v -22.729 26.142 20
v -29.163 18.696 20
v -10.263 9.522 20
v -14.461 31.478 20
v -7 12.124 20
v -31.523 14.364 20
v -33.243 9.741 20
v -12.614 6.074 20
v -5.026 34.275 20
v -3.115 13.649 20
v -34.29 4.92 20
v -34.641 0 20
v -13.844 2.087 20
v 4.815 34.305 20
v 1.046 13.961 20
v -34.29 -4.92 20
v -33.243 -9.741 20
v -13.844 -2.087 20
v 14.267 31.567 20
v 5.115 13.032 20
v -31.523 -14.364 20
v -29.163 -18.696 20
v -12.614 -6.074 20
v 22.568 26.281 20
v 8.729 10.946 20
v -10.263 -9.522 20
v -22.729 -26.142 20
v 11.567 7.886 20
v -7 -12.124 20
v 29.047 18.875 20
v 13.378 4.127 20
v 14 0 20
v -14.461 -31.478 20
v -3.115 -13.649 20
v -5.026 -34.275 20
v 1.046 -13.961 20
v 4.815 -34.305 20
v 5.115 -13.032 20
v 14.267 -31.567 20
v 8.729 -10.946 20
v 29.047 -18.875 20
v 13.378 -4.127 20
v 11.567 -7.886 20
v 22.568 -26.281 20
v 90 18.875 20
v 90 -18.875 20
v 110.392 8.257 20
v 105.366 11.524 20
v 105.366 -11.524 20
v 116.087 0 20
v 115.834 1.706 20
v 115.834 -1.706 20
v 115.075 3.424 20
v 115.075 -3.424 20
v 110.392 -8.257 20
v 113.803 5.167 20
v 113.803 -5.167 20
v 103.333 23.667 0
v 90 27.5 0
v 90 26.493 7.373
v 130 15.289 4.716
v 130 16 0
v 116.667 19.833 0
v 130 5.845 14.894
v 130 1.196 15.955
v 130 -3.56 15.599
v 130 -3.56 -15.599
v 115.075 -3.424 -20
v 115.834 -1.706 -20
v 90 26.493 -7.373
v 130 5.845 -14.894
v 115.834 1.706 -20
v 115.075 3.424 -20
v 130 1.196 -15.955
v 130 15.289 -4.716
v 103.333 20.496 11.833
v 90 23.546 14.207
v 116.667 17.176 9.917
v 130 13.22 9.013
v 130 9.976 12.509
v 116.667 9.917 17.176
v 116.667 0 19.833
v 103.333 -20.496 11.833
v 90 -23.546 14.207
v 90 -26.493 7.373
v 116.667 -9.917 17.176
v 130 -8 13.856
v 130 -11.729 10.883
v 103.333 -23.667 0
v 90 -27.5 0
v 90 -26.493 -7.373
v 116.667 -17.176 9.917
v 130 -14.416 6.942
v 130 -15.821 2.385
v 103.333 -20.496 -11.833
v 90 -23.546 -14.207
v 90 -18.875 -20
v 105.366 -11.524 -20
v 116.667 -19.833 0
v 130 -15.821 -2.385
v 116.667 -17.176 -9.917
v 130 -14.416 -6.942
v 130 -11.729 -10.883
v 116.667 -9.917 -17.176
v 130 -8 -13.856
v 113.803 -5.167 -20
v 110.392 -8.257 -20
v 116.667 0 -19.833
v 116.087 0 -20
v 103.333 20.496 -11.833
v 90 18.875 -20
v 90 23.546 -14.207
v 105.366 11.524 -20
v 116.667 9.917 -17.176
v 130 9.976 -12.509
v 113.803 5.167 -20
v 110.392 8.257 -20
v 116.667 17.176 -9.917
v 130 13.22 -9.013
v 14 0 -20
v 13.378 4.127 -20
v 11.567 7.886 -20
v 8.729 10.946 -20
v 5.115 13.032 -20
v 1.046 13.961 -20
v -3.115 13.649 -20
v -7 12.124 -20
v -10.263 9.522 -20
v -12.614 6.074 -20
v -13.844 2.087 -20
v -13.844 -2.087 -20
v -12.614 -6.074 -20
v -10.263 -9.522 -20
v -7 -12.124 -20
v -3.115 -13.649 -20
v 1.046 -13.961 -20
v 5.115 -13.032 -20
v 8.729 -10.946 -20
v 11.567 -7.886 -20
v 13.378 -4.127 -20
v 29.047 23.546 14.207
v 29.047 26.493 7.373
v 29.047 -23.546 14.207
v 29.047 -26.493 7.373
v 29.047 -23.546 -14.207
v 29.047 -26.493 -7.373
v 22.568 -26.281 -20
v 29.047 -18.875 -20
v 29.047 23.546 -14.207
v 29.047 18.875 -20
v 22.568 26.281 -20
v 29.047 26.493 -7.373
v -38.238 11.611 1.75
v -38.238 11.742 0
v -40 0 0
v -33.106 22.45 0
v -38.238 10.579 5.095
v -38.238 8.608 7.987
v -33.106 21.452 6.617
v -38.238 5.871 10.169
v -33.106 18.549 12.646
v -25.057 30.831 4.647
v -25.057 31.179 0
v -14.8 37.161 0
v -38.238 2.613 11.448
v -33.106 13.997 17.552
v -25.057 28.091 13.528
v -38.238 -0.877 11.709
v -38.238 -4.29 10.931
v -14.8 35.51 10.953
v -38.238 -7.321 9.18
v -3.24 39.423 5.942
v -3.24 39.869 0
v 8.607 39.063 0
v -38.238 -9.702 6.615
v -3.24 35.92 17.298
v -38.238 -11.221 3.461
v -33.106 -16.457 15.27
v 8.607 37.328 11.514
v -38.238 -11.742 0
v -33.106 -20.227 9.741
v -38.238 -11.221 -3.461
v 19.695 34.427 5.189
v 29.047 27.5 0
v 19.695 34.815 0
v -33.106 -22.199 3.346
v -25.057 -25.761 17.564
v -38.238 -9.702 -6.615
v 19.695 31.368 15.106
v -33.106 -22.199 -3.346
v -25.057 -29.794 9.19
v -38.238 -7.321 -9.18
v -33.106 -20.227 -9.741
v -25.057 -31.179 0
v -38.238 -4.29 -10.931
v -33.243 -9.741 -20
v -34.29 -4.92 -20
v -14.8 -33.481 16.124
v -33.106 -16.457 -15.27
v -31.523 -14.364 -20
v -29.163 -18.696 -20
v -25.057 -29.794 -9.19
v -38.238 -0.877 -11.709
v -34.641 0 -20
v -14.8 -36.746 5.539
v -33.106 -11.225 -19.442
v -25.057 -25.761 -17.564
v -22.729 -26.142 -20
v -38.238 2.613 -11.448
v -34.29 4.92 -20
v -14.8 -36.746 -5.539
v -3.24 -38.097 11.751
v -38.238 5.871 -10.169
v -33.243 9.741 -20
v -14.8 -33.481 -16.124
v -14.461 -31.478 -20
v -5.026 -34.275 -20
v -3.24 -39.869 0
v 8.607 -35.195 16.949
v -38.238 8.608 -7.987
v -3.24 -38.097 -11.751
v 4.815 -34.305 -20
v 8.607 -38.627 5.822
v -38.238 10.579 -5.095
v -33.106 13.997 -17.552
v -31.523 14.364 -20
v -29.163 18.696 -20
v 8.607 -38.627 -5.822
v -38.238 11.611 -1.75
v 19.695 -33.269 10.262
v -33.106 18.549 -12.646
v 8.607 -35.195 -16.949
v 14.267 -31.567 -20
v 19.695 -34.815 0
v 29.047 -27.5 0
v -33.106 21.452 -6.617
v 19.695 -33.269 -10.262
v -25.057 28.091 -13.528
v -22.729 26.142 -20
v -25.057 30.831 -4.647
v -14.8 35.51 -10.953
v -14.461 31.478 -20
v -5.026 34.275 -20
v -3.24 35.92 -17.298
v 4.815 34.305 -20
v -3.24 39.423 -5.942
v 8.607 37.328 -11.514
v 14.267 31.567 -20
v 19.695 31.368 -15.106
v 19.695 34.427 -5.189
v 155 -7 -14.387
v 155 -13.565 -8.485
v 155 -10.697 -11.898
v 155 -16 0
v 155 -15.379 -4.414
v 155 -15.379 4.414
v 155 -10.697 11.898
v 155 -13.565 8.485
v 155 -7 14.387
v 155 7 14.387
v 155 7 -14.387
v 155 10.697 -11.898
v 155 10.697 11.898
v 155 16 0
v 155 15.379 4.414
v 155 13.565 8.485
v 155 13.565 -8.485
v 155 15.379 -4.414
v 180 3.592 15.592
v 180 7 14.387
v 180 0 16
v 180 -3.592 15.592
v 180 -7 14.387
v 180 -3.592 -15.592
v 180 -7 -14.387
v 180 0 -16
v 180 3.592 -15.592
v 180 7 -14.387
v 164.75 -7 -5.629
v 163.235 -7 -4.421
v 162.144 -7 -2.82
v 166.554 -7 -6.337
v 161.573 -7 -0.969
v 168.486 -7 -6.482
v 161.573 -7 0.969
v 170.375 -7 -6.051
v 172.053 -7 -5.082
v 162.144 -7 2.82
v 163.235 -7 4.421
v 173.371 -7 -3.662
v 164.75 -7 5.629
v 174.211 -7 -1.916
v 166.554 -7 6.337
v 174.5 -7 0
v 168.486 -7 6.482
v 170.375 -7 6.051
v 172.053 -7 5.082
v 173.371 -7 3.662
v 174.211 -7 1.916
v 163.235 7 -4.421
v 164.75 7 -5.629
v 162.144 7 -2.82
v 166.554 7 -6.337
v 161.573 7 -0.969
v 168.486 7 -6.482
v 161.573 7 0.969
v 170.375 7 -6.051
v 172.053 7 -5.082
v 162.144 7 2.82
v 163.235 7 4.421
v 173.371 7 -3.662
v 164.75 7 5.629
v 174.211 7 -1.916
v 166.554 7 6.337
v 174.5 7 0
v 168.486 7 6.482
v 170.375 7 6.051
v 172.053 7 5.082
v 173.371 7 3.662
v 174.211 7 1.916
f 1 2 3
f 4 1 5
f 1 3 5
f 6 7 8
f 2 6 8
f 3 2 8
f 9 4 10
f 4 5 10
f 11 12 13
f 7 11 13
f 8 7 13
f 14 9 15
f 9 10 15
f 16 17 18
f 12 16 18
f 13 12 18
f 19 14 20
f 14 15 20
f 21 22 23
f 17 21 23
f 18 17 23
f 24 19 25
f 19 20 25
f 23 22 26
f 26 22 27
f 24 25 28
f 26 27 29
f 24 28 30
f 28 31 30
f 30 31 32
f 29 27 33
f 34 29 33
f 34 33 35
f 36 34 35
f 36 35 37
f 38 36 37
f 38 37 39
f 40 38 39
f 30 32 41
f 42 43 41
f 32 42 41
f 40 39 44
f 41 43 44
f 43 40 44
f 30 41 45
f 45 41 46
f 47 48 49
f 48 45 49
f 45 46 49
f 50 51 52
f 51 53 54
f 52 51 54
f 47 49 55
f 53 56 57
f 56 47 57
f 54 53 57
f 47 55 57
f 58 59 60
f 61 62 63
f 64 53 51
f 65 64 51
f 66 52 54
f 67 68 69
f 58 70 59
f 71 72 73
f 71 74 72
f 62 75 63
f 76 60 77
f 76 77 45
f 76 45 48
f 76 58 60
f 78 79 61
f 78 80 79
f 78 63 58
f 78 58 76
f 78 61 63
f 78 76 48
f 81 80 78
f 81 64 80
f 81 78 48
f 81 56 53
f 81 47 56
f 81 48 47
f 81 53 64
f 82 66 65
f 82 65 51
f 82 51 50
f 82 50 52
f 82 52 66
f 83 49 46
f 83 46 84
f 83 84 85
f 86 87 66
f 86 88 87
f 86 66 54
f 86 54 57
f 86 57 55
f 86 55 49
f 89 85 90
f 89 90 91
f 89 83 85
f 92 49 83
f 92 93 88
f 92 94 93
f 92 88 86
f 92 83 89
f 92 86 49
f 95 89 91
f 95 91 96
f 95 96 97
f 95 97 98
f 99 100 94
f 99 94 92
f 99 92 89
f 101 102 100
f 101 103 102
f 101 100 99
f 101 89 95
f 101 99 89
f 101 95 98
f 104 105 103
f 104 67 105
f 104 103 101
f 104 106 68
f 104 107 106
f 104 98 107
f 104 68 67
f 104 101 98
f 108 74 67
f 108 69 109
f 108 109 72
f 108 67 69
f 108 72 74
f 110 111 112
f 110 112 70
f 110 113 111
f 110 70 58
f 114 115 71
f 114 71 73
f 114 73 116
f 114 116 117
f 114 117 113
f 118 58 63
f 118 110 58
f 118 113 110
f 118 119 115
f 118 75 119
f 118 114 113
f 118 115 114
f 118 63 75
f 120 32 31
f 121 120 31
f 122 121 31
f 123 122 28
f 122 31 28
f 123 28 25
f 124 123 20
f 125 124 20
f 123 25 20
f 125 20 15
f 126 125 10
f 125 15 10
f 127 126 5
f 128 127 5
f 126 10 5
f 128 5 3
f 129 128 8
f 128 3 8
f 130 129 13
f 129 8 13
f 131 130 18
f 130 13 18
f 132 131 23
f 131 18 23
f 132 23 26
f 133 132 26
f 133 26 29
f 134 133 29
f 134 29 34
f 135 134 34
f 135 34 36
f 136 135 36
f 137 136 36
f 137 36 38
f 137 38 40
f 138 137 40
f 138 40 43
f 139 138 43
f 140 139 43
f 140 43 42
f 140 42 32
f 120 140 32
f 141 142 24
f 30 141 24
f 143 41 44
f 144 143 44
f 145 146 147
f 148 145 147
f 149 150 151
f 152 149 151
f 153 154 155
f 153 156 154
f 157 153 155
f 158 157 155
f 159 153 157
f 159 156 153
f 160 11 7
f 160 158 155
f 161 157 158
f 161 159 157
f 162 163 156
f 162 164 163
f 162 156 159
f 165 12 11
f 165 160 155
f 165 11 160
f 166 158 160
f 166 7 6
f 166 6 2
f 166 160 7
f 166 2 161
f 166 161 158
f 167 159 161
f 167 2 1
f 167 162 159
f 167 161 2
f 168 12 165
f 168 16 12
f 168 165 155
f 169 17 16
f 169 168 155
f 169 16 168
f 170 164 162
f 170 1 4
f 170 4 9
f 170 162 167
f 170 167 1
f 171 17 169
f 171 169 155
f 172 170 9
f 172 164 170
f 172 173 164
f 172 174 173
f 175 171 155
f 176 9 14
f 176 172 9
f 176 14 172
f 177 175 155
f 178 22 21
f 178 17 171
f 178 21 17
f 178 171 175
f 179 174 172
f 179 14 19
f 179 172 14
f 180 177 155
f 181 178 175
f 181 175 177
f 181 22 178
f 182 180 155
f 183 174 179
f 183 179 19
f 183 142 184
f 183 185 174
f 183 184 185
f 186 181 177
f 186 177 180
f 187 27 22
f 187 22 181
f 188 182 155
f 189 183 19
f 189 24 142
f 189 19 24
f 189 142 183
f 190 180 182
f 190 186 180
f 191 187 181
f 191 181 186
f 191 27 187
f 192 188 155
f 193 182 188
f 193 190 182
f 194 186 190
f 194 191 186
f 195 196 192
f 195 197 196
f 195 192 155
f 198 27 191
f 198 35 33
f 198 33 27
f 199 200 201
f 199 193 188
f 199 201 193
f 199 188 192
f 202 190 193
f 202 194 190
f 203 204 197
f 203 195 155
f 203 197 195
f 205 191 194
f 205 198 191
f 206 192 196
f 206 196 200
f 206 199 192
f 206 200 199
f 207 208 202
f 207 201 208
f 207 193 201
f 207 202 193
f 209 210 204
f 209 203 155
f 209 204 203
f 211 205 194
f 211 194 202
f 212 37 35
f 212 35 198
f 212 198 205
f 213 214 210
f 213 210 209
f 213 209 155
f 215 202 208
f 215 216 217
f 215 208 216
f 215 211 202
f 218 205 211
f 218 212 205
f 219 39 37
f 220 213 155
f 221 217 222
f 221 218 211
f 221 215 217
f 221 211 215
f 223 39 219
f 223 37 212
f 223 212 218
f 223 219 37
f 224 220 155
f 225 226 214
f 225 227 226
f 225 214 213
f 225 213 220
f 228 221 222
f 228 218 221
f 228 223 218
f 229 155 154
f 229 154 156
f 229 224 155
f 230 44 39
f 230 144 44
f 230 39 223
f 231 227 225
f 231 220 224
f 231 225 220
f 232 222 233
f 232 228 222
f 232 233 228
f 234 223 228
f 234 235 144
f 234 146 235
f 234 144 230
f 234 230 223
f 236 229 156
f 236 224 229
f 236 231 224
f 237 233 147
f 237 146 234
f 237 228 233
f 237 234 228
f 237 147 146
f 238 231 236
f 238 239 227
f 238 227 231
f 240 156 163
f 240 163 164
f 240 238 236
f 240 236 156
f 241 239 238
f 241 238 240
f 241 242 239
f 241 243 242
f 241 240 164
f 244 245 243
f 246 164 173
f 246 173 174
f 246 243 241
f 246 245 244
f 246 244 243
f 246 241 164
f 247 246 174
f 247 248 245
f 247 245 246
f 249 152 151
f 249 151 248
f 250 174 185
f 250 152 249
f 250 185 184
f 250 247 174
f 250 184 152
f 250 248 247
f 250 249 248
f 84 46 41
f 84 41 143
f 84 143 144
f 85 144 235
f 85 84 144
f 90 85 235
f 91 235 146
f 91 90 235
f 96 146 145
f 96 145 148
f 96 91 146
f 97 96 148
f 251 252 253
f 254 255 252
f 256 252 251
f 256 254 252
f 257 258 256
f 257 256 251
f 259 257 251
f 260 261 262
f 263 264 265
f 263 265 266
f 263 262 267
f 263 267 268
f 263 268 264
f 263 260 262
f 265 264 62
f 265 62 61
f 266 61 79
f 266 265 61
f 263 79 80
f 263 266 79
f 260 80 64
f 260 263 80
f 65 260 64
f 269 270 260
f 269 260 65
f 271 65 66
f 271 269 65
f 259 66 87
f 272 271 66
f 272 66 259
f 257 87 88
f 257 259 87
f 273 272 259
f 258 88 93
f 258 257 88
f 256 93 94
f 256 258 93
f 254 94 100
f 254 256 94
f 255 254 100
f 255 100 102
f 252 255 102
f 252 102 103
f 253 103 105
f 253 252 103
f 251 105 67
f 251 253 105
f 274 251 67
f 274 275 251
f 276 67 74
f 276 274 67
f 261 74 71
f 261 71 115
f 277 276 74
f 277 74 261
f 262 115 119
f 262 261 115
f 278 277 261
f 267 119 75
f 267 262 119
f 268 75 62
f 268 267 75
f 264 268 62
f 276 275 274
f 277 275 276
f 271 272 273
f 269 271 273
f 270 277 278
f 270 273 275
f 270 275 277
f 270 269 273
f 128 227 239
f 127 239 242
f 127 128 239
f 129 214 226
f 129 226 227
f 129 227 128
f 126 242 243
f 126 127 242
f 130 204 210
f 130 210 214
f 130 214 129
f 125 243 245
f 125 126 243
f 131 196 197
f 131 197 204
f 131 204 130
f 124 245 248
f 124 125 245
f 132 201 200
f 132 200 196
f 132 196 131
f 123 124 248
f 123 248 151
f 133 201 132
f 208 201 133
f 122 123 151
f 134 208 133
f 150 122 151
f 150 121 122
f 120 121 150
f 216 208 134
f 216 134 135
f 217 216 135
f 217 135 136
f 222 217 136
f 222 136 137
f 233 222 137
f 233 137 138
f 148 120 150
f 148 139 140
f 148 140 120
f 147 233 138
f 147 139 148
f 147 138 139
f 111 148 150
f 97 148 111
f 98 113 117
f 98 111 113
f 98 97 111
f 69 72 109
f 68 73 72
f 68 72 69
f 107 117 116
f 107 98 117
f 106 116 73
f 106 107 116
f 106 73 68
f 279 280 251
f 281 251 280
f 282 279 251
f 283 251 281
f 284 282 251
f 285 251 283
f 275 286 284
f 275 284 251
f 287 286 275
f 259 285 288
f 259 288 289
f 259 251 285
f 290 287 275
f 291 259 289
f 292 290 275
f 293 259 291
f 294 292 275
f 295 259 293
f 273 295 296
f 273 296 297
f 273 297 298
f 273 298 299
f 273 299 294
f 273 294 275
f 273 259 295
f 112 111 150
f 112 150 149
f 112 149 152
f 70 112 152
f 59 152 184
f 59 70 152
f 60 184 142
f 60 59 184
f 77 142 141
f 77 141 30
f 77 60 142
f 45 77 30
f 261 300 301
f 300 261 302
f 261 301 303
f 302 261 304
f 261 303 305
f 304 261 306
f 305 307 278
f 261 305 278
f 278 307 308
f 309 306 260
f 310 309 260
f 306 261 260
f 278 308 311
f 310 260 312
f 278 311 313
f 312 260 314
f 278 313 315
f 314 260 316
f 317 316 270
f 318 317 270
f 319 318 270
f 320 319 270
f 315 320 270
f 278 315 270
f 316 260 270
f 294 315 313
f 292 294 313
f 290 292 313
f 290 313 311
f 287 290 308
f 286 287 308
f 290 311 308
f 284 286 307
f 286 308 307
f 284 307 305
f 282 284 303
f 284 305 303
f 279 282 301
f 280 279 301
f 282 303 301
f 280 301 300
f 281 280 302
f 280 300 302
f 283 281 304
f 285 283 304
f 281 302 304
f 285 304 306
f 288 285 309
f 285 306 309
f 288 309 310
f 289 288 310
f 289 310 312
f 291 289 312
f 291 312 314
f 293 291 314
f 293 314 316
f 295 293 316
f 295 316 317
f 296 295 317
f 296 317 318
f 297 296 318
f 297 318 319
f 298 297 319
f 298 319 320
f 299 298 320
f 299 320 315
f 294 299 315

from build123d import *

# Parameters (mm, degrees)
SKETCH_3_OUTSIDE_W       = 271.478
SKETCH_3_OUTSIDE_H       = 131.478
SKETCH_3_OUTSIDE_W_2     = 220
SKETCH_3_OUTSIDE_H_2     = 40
CUT_EXTRUDE_1_DEPTH      = 41
CUT_EXTRUDE_1_DEPTH_BACK = 41
SKETCH_4_R               = 14
SKETCH_4_W               = 25
SKETCH_4_H               = 9
CUT_EXTRUDE_2_DEPTH      = 41
SKETCH_5_R               = 6.5
CUT_EXTRUDE_3_DEPTH      = 48


with BuildPart() as part:
    # 草圖1 → 旋轉1 (revolve)
    with BuildSketch(Plane.XY):
        with BuildLine():
            Line((29.047375097, 27.5), (90, 27.5))
            Line((90, 27.5), (130, 16))
            Line((130, 16), (180, 16))
            Line((180, 16), (180, 0))
            Line((180, 0), (-40, 0))
            ThreePointArc((-40, 0), (-14.800422226, 37.161102001), (29.047375097, 27.5))
        make_face()
    revolve(axis=Axis((-119.807750387, 0, 0), (1, 0, 0)))

    # 草圖3 outside → 除料-伸長1 (cut, two sides)
    with BuildSketch(Plane(origin=(0, 0, 0), x_dir=(1, 0, 0), z_dir=(0, 1, 0))) as cut_extrude_1_sk:
        with Locations((70, 0)):
            Rectangle(SKETCH_3_OUTSIDE_W, SKETCH_3_OUTSIDE_H)
        with Locations((70, 0)):
            Rectangle(SKETCH_3_OUTSIDE_W_2, SKETCH_3_OUTSIDE_H_2, mode=Mode.SUBTRACT)
    extrude(amount=CUT_EXTRUDE_1_DEPTH, mode=Mode.SUBTRACT)
    extrude(cut_extrude_1_sk.sketch, amount=-CUT_EXTRUDE_1_DEPTH_BACK, mode=Mode.SUBTRACT)

    # 草圖4 → 除料-伸長2 (cut, through all)
    with BuildSketch(Plane.XY.offset(20)):
        Circle(SKETCH_4_R)
        with Locations((167.5, 11.5)):
            Rectangle(SKETCH_4_W, SKETCH_4_H)
        with Locations((167.5, -11.5)):
            Rectangle(SKETCH_4_W, SKETCH_4_H)
    extrude(amount=-CUT_EXTRUDE_2_DEPTH, mode=Mode.SUBTRACT)

    # 草圖5 → 除料-伸長3 (cut, through all)
    with BuildSketch(Plane(origin=(0, 7, 0), x_dir=(1, 0, 0), z_dir=(0, 1, 0))):
        with Locations((168, 0)):
            Circle(SKETCH_5_R)
    extrude(amount=-CUT_EXTRUDE_3_DEPTH, mode=Mode.SUBTRACT)


solid = part.part
